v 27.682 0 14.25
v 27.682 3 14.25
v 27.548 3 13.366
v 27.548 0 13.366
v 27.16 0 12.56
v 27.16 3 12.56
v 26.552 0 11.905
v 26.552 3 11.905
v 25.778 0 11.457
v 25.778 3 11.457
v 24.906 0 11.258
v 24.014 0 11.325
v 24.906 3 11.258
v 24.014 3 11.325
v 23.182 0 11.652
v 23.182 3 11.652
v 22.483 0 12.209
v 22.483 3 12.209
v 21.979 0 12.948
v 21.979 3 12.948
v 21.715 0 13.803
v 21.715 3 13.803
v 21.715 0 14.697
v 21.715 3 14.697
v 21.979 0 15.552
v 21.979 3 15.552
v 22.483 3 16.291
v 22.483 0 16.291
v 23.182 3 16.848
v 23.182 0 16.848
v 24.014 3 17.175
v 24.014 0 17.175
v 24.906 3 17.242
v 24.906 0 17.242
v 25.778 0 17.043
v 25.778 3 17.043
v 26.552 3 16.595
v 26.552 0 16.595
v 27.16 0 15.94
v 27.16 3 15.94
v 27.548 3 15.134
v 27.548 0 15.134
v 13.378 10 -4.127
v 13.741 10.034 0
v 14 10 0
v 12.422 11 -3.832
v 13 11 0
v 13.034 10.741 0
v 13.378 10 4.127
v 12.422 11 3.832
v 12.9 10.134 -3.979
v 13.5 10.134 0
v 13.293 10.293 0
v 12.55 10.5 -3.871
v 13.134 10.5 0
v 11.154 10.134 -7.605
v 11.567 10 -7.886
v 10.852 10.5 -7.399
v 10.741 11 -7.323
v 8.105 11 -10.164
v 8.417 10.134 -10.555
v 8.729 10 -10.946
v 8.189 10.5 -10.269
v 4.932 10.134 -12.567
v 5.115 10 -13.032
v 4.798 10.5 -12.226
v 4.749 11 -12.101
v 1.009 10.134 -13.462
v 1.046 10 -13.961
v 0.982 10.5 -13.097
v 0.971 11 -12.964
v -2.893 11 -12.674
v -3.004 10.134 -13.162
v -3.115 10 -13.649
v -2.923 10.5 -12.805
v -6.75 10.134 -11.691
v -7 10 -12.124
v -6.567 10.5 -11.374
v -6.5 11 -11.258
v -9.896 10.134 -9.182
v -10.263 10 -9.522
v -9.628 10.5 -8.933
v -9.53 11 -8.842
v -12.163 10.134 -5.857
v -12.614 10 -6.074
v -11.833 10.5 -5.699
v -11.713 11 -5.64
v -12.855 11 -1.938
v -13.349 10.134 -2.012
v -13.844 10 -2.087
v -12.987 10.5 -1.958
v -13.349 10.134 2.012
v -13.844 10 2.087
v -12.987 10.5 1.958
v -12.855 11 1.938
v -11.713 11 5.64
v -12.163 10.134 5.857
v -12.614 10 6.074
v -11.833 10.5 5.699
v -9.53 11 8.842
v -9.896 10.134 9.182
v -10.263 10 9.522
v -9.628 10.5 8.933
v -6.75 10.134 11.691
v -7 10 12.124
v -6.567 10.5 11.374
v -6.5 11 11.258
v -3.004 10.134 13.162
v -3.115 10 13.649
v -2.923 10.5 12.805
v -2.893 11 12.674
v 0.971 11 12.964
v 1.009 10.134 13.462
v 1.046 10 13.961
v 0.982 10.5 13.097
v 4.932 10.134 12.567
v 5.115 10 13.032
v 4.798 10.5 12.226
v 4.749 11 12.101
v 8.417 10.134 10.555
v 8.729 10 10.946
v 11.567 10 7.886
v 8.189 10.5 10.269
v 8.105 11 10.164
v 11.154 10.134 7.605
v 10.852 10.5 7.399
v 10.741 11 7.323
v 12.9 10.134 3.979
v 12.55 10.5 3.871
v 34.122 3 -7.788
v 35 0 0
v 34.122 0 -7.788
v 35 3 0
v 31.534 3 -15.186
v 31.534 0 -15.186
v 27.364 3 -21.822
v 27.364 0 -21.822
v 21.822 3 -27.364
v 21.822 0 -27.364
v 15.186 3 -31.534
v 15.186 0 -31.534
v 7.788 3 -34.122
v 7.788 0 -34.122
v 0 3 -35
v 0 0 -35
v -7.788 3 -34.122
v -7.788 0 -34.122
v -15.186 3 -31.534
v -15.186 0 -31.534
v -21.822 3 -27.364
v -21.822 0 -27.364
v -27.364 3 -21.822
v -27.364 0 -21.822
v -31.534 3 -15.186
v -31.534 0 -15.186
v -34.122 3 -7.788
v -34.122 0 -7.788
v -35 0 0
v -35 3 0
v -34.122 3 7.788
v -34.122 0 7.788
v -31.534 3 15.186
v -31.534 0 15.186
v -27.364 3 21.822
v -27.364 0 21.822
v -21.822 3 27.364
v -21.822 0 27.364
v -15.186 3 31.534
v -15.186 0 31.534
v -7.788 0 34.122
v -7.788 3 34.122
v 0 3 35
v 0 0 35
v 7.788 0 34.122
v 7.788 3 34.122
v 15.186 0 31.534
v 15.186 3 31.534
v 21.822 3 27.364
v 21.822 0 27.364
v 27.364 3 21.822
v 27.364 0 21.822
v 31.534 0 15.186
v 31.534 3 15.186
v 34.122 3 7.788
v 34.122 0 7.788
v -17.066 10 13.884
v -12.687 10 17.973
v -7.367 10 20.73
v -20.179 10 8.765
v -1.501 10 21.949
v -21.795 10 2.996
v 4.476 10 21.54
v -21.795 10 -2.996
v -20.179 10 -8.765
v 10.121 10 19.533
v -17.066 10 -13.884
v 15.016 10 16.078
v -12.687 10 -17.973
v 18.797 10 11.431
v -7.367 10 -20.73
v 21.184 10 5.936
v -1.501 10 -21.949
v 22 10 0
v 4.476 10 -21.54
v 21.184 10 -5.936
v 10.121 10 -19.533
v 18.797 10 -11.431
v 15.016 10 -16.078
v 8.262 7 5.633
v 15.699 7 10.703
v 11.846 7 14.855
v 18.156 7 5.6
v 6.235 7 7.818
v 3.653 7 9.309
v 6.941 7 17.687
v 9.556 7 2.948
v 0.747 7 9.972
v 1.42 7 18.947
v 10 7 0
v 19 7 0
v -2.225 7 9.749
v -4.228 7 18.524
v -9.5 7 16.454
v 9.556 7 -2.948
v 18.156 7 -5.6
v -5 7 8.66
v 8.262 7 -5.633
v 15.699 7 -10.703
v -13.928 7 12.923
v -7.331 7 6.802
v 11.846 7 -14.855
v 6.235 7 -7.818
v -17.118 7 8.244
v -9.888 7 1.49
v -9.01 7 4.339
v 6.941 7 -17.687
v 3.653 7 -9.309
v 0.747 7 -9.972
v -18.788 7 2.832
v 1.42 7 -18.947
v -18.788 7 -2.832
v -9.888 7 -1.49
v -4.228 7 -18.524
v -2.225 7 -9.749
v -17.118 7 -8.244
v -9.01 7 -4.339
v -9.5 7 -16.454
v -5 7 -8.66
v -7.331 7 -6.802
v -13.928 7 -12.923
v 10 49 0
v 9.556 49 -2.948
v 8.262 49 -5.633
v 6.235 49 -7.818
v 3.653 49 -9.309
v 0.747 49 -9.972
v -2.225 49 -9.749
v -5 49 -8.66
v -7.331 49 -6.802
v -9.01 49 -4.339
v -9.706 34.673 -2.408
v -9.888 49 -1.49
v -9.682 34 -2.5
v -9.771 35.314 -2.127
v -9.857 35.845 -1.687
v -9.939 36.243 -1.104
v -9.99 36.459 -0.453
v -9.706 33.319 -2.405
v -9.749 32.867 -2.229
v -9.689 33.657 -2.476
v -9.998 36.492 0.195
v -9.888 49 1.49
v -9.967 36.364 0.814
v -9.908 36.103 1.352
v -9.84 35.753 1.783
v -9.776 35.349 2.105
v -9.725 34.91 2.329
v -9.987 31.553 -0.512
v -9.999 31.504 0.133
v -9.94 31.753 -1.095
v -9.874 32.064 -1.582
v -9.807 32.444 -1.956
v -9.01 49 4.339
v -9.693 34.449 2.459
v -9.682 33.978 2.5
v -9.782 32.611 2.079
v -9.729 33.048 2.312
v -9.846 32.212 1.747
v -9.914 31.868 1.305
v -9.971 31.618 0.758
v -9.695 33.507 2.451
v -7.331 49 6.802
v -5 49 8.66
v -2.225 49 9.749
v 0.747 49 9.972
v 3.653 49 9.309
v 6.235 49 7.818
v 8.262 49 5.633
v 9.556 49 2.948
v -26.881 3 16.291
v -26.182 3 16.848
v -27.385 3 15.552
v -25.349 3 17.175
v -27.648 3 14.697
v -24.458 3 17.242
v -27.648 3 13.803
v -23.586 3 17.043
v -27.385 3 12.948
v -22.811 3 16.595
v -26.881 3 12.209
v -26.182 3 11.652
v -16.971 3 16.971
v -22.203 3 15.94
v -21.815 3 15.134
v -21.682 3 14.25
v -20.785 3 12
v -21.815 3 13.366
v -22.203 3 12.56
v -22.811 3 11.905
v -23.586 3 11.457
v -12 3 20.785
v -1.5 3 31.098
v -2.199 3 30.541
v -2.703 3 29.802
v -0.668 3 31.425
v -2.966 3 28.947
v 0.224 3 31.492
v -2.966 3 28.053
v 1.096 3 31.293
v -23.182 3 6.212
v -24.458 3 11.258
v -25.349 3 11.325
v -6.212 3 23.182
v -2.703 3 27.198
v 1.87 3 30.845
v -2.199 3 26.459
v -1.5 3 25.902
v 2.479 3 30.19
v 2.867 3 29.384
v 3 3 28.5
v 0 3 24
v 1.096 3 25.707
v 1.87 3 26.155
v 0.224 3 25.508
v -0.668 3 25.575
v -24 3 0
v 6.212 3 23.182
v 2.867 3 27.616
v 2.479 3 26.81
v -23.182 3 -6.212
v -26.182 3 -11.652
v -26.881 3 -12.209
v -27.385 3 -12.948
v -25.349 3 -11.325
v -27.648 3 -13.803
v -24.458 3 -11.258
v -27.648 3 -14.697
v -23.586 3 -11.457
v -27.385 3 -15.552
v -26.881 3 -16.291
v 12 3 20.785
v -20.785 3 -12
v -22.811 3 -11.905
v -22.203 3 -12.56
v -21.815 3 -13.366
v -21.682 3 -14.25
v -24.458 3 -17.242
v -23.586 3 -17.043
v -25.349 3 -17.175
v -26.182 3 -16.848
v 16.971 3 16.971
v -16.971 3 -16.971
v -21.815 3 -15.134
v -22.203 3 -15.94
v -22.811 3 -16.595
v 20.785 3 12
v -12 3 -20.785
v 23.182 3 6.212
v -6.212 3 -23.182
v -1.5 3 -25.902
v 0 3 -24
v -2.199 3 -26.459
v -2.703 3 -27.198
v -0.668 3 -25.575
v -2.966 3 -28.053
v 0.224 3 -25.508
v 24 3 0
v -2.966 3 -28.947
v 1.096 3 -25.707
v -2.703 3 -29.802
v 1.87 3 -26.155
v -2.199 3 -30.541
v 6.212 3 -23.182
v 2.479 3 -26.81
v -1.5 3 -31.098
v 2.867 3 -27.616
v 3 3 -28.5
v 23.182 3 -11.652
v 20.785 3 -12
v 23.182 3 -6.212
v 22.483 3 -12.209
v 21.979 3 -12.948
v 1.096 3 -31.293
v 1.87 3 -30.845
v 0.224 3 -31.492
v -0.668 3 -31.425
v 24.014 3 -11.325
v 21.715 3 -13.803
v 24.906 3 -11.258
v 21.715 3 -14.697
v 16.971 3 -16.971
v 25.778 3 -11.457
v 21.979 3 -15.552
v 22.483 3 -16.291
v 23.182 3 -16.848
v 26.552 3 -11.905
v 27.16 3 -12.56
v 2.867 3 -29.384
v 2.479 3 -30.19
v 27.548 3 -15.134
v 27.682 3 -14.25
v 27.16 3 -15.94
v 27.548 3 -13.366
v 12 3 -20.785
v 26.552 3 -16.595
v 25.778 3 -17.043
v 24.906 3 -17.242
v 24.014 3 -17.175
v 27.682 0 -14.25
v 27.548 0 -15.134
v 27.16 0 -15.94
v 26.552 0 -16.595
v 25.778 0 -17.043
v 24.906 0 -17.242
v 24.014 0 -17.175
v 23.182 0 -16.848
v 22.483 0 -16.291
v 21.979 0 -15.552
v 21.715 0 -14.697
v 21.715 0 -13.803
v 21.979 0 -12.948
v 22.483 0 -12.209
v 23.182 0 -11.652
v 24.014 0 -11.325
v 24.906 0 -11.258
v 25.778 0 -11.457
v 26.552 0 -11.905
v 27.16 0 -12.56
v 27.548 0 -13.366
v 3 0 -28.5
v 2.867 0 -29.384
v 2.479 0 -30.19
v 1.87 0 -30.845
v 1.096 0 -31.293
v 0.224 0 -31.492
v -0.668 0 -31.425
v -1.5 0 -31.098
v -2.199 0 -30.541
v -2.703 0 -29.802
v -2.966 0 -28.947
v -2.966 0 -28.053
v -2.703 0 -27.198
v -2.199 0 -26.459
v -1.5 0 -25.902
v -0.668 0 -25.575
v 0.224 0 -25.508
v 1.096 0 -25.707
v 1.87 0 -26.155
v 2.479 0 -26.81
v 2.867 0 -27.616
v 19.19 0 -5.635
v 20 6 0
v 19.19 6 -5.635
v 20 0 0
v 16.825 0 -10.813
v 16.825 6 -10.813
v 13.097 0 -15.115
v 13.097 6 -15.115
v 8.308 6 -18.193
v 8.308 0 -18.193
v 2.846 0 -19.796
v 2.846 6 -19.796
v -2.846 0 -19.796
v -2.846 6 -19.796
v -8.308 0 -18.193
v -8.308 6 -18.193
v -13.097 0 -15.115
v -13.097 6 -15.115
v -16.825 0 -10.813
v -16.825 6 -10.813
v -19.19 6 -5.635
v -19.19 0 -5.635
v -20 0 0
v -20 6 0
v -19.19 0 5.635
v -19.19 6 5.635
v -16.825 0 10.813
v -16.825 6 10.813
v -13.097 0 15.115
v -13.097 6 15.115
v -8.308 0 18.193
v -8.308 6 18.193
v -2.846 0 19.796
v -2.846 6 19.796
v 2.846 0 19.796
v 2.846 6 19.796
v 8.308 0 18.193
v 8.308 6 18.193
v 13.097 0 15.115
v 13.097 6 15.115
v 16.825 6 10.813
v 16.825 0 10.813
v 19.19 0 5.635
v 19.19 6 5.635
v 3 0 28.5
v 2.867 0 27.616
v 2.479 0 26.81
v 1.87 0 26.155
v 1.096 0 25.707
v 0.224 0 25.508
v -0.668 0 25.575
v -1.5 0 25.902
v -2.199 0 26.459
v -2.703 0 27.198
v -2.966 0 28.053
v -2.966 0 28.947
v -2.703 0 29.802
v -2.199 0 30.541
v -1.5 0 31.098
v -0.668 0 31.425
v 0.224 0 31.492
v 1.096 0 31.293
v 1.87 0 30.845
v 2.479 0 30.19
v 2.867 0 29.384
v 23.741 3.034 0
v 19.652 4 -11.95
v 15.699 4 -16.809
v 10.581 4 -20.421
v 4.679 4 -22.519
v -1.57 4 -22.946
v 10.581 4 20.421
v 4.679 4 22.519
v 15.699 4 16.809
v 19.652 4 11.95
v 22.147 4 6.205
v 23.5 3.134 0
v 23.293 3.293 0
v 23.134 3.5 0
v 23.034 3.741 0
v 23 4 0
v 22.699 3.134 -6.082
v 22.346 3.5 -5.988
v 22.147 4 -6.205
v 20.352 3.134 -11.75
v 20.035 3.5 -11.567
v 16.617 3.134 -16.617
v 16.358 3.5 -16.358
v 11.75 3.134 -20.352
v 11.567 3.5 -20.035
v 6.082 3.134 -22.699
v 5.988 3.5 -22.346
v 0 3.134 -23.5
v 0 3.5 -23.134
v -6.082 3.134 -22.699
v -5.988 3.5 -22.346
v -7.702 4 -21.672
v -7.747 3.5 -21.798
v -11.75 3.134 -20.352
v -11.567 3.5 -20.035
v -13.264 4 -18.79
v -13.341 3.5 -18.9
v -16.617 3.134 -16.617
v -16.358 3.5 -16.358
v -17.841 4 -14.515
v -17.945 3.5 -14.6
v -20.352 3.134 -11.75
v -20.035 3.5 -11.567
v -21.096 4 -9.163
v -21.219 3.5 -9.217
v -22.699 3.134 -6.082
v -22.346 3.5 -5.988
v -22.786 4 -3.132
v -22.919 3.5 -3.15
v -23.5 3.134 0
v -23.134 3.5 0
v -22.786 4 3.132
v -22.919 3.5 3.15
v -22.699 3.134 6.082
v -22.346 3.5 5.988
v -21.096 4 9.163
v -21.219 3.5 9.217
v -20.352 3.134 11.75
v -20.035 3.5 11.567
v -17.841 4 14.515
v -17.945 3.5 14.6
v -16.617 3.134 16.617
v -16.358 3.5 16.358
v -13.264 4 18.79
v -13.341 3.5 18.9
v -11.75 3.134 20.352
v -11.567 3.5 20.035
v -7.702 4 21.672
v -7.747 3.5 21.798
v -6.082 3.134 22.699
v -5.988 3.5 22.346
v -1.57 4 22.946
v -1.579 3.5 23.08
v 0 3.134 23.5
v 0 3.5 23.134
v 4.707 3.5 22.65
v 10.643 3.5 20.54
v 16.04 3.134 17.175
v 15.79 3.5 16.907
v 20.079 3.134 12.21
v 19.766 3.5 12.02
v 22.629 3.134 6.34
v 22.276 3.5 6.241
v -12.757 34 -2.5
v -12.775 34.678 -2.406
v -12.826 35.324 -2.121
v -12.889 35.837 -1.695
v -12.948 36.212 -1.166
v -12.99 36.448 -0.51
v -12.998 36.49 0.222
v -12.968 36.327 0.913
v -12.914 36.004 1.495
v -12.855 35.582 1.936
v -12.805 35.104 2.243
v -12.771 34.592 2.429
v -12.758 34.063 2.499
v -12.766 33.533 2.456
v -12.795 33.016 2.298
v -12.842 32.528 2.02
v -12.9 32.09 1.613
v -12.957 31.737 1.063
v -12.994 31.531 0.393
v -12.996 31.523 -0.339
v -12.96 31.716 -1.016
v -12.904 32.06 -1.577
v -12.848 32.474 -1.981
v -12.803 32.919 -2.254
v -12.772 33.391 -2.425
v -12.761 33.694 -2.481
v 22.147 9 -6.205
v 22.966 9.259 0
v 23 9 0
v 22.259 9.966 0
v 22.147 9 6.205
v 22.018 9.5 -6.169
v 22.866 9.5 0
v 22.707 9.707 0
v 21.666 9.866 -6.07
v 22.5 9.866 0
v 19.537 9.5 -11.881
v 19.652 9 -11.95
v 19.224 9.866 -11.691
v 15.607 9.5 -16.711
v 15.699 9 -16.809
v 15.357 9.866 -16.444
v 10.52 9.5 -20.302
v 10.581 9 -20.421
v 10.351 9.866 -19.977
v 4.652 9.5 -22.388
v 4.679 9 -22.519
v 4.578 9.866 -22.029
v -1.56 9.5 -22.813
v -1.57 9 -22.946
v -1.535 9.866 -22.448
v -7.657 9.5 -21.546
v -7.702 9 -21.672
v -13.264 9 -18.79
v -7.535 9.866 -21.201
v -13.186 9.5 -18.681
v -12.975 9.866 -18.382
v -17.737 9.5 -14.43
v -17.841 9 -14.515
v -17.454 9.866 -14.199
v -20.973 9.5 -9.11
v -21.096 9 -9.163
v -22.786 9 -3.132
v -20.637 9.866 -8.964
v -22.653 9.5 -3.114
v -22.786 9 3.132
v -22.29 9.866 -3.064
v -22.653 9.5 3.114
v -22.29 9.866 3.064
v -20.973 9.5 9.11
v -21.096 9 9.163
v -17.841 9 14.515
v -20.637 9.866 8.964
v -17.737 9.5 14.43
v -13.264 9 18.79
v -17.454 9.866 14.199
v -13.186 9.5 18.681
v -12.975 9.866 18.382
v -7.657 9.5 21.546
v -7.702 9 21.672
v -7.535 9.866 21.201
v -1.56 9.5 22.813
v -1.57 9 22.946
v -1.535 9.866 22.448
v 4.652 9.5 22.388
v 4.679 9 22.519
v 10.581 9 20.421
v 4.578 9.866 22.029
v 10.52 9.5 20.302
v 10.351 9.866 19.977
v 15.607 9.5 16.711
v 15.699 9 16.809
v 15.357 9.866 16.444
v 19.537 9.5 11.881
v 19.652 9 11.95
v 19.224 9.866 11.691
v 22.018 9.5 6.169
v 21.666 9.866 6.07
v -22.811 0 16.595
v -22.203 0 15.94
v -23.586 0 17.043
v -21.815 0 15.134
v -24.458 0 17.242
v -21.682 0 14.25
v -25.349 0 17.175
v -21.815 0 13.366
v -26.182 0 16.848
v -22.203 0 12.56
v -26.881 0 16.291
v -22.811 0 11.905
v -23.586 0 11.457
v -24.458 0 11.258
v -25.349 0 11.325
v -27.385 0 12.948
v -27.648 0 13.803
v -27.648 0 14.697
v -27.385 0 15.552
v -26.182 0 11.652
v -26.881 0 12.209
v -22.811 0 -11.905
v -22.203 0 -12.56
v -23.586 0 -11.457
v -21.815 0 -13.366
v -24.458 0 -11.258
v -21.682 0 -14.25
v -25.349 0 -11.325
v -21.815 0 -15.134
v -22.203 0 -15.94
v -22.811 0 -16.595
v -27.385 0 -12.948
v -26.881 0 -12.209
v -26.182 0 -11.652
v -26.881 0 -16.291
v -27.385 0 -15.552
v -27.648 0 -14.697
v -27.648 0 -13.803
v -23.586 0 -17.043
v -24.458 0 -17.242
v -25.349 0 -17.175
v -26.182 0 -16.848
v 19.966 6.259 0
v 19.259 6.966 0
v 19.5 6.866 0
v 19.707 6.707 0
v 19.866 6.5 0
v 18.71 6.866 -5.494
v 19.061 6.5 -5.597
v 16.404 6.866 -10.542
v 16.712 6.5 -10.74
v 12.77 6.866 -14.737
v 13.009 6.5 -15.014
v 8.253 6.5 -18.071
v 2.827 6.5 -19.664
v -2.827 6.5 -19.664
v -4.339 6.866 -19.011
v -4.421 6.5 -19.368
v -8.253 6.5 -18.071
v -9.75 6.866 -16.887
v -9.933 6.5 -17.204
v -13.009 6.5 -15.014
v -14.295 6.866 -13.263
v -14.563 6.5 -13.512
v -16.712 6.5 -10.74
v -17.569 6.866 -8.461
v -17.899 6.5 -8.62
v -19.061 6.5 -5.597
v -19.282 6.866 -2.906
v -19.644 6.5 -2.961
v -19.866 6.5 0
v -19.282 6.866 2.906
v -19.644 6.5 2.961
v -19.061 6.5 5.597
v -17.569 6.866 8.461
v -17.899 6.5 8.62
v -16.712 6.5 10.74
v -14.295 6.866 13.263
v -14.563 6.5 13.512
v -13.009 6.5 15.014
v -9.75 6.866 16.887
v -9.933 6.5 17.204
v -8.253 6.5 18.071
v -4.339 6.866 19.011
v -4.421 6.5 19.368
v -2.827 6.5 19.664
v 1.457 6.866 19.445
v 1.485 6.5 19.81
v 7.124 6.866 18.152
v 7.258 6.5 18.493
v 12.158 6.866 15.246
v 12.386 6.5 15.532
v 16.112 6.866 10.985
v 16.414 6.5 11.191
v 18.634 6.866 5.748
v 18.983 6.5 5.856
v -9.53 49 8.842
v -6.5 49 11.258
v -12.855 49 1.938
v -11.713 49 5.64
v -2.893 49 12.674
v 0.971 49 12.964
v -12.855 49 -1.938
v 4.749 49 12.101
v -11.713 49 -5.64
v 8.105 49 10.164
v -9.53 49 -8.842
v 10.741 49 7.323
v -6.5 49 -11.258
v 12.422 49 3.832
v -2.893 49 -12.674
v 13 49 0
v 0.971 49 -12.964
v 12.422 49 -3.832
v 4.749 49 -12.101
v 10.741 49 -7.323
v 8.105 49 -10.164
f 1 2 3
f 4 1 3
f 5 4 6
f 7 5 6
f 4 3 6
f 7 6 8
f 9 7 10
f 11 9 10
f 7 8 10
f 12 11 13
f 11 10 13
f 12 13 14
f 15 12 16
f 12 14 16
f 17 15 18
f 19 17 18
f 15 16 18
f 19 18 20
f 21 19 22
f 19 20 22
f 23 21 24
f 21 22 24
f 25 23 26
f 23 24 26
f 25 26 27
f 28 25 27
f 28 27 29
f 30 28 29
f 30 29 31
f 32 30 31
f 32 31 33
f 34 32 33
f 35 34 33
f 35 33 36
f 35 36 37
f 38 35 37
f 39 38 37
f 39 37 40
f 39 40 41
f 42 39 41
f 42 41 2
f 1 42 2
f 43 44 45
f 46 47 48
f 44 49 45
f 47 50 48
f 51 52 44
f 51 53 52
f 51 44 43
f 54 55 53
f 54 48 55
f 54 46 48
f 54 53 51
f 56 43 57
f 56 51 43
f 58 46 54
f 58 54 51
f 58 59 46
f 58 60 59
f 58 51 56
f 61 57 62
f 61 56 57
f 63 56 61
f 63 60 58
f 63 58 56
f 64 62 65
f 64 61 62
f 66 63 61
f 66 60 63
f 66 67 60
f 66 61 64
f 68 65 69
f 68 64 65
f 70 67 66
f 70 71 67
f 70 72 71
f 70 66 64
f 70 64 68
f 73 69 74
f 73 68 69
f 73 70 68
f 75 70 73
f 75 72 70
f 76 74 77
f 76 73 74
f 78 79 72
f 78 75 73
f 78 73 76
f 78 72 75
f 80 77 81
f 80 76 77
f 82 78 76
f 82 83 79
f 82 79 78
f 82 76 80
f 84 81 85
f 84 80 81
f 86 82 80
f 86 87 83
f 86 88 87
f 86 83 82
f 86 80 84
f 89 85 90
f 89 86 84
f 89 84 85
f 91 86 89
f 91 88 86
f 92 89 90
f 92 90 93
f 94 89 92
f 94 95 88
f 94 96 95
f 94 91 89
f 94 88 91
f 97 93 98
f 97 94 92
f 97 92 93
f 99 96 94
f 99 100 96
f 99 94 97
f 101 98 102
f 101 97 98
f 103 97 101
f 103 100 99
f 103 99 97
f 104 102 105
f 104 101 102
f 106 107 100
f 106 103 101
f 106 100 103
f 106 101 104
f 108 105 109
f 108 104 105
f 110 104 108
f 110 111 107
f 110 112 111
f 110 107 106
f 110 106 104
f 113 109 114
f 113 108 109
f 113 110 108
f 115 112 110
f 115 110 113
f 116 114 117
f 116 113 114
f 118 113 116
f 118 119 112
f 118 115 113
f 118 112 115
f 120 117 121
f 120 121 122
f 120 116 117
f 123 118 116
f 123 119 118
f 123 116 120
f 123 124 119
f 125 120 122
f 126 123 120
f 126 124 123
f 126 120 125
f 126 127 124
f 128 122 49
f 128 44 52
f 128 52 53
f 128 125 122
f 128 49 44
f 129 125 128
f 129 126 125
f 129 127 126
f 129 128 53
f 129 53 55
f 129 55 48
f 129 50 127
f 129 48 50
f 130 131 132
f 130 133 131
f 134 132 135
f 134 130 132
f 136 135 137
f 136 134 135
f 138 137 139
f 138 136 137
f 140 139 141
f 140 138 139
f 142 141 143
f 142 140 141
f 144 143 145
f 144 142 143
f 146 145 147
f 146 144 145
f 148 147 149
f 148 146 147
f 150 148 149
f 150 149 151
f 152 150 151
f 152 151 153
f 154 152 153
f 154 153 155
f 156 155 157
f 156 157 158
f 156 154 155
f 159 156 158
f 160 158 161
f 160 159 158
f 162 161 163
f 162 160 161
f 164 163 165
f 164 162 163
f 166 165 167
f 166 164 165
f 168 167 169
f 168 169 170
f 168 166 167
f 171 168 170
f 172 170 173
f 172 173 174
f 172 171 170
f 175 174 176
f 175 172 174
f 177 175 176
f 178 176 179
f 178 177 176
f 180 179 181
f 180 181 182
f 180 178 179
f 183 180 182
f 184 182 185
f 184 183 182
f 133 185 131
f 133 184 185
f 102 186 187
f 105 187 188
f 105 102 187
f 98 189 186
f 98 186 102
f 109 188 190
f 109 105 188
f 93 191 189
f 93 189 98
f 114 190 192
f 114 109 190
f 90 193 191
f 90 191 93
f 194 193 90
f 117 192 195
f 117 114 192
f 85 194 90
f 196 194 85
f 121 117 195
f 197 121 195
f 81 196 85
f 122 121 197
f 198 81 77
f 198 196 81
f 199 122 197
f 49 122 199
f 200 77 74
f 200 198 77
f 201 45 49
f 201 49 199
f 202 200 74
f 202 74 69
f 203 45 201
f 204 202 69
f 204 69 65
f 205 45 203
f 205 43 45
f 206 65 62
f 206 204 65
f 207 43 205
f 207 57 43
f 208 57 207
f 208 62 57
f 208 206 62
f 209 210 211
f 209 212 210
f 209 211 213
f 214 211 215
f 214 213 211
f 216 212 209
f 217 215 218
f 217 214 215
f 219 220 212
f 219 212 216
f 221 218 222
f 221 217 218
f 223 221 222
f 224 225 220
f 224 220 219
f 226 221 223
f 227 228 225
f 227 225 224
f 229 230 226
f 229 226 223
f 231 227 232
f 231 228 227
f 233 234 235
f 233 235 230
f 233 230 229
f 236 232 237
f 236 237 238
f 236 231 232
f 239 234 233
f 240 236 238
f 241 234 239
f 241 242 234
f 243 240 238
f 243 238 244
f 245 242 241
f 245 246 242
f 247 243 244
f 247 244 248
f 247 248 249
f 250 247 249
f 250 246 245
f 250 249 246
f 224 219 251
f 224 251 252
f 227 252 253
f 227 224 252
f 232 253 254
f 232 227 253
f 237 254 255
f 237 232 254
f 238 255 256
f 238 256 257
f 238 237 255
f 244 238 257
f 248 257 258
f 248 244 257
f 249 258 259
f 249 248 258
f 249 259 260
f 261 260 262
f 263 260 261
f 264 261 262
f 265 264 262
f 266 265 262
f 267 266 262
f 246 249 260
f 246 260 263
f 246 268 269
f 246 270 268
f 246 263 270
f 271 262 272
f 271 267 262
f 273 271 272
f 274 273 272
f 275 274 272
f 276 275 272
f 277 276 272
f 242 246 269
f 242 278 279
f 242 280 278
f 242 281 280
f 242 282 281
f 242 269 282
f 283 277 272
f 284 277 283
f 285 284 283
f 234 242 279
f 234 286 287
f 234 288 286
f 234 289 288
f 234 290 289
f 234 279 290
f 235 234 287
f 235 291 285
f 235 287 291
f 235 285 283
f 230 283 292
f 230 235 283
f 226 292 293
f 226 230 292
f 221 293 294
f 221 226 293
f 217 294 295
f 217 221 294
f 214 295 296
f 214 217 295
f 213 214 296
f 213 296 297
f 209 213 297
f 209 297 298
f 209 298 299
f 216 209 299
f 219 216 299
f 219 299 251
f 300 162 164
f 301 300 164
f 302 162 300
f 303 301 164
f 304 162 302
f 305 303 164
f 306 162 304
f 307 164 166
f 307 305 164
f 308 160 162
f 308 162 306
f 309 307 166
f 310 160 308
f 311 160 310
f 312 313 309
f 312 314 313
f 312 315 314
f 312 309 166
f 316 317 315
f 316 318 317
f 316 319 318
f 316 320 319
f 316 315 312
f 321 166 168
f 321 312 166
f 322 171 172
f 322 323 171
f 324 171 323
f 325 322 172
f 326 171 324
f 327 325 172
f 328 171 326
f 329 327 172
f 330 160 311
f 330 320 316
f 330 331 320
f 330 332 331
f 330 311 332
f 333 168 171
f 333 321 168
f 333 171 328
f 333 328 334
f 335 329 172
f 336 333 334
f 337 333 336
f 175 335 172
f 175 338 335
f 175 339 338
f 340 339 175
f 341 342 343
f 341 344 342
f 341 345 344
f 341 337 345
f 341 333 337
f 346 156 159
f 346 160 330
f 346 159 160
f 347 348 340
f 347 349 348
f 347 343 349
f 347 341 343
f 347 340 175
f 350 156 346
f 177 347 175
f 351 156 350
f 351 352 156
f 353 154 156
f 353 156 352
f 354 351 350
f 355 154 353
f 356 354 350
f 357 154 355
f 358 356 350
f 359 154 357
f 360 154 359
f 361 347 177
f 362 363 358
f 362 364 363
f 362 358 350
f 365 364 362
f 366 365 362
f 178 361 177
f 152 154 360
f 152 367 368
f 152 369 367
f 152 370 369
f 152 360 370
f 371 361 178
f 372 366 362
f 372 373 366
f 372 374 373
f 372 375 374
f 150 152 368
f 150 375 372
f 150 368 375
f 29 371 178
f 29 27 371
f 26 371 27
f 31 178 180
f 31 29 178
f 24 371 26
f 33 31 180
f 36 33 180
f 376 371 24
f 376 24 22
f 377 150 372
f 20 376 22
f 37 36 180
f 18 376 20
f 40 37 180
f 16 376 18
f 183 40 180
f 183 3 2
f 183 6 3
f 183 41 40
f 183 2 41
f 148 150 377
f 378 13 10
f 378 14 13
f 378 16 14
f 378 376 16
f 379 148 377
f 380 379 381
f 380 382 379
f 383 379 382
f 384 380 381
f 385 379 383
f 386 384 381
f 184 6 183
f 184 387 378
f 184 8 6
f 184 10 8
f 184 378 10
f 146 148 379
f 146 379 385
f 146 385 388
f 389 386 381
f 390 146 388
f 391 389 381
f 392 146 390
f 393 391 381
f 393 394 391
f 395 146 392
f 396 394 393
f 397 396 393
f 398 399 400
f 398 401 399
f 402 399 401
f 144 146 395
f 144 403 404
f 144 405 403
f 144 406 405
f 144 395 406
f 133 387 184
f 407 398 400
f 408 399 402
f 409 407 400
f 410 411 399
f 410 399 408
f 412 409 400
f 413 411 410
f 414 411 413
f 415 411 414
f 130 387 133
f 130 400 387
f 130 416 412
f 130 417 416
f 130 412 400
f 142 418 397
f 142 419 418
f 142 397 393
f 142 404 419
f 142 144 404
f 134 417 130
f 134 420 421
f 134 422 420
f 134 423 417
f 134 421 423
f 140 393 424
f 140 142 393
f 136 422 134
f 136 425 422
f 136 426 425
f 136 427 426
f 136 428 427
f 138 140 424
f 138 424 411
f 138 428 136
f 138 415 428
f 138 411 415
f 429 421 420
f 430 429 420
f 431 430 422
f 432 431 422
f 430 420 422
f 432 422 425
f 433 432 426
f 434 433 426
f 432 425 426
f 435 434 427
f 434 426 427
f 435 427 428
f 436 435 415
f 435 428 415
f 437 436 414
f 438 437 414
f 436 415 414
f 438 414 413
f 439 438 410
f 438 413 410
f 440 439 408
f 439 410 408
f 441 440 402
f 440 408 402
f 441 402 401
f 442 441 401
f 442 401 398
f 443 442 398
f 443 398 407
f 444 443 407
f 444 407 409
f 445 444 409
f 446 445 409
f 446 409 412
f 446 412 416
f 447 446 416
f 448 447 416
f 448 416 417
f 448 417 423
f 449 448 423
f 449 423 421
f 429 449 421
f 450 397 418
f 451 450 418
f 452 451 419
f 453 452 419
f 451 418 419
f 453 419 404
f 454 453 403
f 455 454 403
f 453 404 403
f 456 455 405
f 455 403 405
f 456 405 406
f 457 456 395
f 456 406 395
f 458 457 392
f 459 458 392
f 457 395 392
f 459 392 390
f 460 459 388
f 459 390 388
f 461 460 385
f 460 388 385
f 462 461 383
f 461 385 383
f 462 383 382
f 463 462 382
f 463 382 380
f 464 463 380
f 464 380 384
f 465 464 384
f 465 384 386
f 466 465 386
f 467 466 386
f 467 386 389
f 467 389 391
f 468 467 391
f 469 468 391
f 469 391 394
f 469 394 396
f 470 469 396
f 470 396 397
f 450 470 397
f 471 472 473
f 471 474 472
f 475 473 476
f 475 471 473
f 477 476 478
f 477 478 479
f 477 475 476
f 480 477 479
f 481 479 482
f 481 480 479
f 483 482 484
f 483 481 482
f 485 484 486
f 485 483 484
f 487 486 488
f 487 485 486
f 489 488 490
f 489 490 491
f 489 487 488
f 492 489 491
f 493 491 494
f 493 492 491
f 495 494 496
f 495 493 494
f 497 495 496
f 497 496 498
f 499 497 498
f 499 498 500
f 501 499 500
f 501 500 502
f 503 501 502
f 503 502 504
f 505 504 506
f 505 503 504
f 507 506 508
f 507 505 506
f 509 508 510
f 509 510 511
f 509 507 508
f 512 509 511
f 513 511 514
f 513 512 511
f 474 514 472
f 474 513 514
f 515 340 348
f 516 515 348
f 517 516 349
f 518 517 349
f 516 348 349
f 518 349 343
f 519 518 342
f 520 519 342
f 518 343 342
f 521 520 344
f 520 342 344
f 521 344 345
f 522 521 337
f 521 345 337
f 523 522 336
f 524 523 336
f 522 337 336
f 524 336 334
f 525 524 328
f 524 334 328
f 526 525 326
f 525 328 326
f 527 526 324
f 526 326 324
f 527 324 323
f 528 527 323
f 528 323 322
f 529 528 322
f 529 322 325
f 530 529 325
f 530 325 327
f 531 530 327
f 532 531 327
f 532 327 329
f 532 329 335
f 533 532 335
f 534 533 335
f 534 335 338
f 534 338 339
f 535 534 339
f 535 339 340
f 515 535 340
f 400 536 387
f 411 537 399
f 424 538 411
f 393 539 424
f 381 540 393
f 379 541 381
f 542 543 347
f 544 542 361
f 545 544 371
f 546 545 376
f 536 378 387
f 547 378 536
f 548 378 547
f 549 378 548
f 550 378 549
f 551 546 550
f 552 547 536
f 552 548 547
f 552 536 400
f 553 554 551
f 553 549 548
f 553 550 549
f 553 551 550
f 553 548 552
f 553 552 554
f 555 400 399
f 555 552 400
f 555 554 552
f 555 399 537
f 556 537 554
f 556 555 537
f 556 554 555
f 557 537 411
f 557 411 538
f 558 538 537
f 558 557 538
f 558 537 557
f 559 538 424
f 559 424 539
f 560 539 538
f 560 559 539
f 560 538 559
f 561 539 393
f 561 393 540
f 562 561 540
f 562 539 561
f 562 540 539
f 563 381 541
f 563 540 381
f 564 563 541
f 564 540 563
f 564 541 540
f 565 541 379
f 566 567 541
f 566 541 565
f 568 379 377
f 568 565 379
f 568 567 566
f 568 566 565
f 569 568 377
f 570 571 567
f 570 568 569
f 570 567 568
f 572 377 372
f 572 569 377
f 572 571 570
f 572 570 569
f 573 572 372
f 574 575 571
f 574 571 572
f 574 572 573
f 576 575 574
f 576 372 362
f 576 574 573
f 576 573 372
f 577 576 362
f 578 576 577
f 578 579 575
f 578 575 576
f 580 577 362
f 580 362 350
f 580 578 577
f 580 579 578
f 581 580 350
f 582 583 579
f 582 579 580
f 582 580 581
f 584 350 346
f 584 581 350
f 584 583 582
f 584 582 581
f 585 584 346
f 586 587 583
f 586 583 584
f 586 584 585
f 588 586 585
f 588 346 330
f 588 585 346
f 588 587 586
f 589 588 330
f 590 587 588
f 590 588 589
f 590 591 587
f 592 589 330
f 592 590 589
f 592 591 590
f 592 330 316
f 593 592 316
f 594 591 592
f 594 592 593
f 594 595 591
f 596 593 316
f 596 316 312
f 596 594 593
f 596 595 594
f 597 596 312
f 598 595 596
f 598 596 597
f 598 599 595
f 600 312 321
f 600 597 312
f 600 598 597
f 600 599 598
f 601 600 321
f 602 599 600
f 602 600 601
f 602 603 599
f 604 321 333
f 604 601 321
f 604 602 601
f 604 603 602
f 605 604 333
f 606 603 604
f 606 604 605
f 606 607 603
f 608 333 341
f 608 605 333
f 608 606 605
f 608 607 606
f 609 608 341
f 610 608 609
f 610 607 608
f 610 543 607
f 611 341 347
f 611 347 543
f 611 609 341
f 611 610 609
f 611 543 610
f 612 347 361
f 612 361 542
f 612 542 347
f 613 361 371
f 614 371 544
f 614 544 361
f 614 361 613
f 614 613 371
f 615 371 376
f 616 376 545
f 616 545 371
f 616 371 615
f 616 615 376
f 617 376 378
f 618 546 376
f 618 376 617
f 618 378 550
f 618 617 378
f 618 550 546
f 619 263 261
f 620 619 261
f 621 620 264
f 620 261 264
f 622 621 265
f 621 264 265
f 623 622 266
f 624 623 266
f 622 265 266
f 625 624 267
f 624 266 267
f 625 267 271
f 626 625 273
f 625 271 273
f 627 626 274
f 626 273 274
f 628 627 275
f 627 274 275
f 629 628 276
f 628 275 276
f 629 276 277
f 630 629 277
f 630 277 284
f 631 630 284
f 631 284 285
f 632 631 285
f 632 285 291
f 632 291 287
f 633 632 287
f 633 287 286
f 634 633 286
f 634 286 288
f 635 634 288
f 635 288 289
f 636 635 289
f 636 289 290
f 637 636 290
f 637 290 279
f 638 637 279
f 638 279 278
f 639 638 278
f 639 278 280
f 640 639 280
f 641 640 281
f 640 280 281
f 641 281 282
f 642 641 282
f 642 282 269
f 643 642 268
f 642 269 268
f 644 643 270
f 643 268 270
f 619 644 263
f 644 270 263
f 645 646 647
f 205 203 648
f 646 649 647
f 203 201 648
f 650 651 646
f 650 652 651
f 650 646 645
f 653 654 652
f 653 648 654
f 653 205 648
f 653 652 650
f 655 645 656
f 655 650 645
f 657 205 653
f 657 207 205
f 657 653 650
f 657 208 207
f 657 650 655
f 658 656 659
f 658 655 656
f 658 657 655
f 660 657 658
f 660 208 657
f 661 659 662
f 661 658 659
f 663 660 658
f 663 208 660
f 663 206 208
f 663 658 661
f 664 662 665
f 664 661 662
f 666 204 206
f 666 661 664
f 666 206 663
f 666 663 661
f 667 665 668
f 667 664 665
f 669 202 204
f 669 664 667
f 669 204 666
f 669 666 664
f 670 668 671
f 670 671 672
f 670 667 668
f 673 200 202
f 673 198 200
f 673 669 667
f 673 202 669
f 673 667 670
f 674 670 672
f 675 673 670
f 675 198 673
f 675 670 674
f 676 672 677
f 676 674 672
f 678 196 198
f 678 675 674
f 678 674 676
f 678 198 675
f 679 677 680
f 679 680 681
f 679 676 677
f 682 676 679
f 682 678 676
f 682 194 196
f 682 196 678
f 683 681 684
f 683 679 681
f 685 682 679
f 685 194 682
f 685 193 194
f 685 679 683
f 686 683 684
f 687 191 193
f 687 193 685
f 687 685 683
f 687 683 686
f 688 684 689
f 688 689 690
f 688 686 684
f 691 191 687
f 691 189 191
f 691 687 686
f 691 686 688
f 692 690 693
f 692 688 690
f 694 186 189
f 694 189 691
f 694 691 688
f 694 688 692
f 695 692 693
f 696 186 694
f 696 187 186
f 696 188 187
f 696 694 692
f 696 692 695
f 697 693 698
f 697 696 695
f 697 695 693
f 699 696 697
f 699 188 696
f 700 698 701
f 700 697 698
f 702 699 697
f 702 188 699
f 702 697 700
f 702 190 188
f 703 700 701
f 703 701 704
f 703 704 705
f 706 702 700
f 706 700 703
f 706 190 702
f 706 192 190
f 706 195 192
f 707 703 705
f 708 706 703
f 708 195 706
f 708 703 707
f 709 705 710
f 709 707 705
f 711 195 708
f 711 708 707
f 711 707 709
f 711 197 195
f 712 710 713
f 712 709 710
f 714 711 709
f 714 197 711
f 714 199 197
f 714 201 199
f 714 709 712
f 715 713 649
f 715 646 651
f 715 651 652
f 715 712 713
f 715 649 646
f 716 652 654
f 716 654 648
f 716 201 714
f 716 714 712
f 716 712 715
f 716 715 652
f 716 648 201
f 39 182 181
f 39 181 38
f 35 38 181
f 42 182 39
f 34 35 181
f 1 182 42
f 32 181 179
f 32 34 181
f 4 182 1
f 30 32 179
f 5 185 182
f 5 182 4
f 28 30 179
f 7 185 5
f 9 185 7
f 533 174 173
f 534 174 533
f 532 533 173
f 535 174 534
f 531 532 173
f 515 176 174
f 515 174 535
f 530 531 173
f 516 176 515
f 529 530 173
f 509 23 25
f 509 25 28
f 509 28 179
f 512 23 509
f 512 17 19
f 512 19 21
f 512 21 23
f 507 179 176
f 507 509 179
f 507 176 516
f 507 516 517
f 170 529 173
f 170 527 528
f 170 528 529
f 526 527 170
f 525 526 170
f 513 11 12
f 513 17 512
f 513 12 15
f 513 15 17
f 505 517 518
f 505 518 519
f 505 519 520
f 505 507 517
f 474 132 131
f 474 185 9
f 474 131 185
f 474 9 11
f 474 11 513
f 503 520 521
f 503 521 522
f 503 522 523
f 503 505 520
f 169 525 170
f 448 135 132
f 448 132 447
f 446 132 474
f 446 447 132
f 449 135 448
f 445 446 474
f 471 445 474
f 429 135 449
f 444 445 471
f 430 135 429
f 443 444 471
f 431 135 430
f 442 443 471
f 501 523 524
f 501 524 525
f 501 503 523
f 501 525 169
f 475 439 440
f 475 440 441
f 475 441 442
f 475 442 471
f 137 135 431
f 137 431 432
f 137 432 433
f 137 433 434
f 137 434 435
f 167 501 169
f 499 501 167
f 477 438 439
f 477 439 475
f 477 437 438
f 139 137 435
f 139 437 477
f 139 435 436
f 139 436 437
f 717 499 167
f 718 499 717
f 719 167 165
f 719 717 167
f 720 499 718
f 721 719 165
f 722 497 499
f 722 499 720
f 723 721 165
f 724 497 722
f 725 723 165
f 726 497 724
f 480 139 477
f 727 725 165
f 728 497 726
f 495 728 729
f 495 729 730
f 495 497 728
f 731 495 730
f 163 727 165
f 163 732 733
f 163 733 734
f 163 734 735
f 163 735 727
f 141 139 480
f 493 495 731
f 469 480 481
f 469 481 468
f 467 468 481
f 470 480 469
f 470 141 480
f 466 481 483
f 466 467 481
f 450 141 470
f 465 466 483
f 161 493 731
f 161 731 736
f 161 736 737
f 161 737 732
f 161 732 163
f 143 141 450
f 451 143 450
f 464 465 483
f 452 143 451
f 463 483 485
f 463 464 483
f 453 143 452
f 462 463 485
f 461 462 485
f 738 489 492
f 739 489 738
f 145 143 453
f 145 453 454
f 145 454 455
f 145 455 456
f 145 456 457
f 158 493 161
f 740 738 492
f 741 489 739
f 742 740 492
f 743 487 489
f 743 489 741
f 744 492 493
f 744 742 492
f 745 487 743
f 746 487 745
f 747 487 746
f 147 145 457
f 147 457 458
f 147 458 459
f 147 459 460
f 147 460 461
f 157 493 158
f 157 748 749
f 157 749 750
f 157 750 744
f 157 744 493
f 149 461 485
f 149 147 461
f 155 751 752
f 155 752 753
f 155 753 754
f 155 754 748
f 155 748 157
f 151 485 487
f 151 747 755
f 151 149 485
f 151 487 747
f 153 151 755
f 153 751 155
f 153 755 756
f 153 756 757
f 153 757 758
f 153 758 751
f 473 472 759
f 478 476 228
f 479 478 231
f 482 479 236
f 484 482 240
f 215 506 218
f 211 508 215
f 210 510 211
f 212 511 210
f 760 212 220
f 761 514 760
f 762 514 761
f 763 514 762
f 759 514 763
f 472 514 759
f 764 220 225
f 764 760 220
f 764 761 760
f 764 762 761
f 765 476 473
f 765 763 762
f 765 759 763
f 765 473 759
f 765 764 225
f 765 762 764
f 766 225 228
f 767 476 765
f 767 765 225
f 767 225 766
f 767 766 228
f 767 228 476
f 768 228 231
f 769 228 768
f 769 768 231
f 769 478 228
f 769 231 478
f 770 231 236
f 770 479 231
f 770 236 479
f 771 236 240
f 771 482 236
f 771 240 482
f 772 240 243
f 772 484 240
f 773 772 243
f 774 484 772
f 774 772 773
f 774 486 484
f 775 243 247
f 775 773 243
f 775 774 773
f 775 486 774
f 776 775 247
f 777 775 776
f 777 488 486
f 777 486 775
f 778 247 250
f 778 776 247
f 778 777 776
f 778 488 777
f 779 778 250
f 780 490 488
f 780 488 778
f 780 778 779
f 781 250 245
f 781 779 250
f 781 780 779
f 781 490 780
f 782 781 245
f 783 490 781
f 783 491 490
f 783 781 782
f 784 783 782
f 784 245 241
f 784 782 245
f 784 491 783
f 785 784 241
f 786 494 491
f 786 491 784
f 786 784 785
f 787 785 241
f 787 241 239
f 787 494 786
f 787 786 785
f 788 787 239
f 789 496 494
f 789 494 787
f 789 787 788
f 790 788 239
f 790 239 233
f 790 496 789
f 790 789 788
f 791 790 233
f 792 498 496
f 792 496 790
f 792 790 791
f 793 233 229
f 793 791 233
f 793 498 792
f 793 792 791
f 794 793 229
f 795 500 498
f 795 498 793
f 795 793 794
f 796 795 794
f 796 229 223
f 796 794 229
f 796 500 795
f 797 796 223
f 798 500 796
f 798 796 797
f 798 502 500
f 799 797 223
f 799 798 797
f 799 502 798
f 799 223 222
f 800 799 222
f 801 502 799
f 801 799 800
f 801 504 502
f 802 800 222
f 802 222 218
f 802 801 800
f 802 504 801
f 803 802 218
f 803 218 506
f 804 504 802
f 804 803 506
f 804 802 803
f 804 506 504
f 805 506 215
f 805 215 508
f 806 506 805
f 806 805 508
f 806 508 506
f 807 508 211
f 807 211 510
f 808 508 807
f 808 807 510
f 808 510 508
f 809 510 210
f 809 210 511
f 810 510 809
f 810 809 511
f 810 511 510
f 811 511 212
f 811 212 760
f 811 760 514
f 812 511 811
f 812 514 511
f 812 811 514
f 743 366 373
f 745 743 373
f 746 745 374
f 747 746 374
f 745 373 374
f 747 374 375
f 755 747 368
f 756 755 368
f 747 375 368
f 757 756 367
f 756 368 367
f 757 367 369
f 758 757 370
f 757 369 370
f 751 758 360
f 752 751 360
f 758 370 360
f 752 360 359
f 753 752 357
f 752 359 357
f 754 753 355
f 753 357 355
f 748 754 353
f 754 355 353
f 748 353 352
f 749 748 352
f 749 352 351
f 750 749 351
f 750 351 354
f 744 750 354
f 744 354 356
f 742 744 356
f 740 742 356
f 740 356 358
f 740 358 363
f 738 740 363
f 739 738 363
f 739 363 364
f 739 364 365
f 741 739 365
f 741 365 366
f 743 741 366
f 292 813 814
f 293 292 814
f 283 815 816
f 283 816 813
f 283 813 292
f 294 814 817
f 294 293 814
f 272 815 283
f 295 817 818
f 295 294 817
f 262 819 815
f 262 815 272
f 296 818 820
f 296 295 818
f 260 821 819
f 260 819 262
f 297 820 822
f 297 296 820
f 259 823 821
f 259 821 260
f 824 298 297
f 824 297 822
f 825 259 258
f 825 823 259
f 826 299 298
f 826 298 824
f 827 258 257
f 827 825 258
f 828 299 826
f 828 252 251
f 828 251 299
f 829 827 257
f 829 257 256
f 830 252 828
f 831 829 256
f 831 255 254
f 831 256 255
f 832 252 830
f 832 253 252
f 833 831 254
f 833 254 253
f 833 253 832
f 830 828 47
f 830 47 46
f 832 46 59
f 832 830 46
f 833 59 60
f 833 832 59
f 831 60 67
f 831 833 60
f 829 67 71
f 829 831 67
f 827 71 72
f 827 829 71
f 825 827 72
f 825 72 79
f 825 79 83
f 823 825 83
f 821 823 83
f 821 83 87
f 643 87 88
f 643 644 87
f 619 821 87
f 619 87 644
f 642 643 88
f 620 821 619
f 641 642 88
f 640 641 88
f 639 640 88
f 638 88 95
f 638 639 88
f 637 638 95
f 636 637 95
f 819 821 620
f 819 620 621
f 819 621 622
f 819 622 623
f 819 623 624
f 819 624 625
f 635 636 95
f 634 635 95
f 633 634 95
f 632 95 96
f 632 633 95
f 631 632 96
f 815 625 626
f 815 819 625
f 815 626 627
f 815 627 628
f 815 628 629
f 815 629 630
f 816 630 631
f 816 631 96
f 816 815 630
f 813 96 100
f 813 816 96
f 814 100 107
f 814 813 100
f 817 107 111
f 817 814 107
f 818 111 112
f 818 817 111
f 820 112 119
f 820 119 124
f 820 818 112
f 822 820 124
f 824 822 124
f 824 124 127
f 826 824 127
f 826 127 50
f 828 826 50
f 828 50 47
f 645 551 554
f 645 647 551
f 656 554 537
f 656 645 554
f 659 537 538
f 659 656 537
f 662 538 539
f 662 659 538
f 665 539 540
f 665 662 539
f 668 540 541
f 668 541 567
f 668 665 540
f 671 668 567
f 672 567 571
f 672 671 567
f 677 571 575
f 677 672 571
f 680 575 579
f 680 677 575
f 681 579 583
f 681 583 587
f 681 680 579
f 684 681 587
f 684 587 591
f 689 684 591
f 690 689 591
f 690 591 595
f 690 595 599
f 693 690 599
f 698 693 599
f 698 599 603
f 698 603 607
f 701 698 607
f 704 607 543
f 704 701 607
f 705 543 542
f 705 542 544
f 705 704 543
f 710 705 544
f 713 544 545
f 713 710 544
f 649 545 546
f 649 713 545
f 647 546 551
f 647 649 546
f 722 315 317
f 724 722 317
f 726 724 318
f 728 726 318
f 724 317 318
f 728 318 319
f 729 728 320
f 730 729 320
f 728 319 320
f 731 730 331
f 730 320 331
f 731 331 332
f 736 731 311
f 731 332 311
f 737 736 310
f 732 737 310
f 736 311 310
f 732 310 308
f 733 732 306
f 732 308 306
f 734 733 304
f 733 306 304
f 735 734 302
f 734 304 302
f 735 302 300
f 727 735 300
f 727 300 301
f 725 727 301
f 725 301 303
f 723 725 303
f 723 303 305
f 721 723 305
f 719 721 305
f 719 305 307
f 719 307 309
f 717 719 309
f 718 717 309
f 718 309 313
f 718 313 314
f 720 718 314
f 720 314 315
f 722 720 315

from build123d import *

# Parameters (mm, degrees)
SKETCH_2_R          = 3
CUT_EXTRUDE_1_DEPTH = 4
SKETCH_3_R          = 2.5
CUT_EXTRUDE_2_DEPTH = 36


with BuildPart() as part:
    # 草图1 → 旋转1 (revolve)
    with BuildSketch(Plane.XY):
        with BuildLine():
            Line((20, 0), (35, 0))
            Line((35, 0), (35, 3))
            Line((35, 3), (24, 3))
            ThreePointArc((24, 3), (23.292893219, 3.292893219), (23, 4))
            Line((23, 4), (23, 9))
            ThreePointArc((23, 9), (22.707106781, 9.707106781), (22, 10))
            Line((22, 10), (14, 10))
            ThreePointArc((14, 10), (13.292893219, 10.292893219), (13, 11))
            Line((13, 11), (13, 49))
            Line((13, 49), (10, 49))
            Line((10, 49), (10, 7))
            Line((10, 7), (19, 7))
            ThreePointArc((19, 7), (19.707106781, 6.707106781), (20, 6))
            Line((20, 6), (20, 0))
        make_face()
    revolve(axis=Axis((0, 0, 0), (0, 1, 0)))

    # 草图2 → 切除-拉伸1 (cut, through all)
    with BuildSketch(Plane(origin=(0, 3, 0), x_dir=(1, 0, 0), z_dir=(0, 1, 0))):
        with Locations((0, 28.5)):
            Circle(SKETCH_2_R)
        with Locations((24.681724008, 14.25)):
            Circle(SKETCH_2_R)
        with Locations((24.681724008, -14.25)):
            Circle(SKETCH_2_R)
        with Locations((0, -28.5)):
            Circle(SKETCH_2_R)
        with Locations((-24.681724008, -14.25)):
            Circle(SKETCH_2_R)
        with Locations((-24.681724008, 14.25)):
            Circle(SKETCH_2_R)
    extrude(amount=-CUT_EXTRUDE_1_DEPTH, mode=Mode.SUBTRACT)

    # 草图3 → 切除-拉伸2 (cut, through all)
    with BuildSketch(Plane(origin=(0, 0, 0), x_dir=(0, 0, -1), z_dir=(1, 0, 0))):
        with Locations((0, 34)):
            Circle(SKETCH_3_R)
    extrude(amount=-CUT_EXTRUDE_2_DEPTH, mode=Mode.SUBTRACT)


solid = part.part
